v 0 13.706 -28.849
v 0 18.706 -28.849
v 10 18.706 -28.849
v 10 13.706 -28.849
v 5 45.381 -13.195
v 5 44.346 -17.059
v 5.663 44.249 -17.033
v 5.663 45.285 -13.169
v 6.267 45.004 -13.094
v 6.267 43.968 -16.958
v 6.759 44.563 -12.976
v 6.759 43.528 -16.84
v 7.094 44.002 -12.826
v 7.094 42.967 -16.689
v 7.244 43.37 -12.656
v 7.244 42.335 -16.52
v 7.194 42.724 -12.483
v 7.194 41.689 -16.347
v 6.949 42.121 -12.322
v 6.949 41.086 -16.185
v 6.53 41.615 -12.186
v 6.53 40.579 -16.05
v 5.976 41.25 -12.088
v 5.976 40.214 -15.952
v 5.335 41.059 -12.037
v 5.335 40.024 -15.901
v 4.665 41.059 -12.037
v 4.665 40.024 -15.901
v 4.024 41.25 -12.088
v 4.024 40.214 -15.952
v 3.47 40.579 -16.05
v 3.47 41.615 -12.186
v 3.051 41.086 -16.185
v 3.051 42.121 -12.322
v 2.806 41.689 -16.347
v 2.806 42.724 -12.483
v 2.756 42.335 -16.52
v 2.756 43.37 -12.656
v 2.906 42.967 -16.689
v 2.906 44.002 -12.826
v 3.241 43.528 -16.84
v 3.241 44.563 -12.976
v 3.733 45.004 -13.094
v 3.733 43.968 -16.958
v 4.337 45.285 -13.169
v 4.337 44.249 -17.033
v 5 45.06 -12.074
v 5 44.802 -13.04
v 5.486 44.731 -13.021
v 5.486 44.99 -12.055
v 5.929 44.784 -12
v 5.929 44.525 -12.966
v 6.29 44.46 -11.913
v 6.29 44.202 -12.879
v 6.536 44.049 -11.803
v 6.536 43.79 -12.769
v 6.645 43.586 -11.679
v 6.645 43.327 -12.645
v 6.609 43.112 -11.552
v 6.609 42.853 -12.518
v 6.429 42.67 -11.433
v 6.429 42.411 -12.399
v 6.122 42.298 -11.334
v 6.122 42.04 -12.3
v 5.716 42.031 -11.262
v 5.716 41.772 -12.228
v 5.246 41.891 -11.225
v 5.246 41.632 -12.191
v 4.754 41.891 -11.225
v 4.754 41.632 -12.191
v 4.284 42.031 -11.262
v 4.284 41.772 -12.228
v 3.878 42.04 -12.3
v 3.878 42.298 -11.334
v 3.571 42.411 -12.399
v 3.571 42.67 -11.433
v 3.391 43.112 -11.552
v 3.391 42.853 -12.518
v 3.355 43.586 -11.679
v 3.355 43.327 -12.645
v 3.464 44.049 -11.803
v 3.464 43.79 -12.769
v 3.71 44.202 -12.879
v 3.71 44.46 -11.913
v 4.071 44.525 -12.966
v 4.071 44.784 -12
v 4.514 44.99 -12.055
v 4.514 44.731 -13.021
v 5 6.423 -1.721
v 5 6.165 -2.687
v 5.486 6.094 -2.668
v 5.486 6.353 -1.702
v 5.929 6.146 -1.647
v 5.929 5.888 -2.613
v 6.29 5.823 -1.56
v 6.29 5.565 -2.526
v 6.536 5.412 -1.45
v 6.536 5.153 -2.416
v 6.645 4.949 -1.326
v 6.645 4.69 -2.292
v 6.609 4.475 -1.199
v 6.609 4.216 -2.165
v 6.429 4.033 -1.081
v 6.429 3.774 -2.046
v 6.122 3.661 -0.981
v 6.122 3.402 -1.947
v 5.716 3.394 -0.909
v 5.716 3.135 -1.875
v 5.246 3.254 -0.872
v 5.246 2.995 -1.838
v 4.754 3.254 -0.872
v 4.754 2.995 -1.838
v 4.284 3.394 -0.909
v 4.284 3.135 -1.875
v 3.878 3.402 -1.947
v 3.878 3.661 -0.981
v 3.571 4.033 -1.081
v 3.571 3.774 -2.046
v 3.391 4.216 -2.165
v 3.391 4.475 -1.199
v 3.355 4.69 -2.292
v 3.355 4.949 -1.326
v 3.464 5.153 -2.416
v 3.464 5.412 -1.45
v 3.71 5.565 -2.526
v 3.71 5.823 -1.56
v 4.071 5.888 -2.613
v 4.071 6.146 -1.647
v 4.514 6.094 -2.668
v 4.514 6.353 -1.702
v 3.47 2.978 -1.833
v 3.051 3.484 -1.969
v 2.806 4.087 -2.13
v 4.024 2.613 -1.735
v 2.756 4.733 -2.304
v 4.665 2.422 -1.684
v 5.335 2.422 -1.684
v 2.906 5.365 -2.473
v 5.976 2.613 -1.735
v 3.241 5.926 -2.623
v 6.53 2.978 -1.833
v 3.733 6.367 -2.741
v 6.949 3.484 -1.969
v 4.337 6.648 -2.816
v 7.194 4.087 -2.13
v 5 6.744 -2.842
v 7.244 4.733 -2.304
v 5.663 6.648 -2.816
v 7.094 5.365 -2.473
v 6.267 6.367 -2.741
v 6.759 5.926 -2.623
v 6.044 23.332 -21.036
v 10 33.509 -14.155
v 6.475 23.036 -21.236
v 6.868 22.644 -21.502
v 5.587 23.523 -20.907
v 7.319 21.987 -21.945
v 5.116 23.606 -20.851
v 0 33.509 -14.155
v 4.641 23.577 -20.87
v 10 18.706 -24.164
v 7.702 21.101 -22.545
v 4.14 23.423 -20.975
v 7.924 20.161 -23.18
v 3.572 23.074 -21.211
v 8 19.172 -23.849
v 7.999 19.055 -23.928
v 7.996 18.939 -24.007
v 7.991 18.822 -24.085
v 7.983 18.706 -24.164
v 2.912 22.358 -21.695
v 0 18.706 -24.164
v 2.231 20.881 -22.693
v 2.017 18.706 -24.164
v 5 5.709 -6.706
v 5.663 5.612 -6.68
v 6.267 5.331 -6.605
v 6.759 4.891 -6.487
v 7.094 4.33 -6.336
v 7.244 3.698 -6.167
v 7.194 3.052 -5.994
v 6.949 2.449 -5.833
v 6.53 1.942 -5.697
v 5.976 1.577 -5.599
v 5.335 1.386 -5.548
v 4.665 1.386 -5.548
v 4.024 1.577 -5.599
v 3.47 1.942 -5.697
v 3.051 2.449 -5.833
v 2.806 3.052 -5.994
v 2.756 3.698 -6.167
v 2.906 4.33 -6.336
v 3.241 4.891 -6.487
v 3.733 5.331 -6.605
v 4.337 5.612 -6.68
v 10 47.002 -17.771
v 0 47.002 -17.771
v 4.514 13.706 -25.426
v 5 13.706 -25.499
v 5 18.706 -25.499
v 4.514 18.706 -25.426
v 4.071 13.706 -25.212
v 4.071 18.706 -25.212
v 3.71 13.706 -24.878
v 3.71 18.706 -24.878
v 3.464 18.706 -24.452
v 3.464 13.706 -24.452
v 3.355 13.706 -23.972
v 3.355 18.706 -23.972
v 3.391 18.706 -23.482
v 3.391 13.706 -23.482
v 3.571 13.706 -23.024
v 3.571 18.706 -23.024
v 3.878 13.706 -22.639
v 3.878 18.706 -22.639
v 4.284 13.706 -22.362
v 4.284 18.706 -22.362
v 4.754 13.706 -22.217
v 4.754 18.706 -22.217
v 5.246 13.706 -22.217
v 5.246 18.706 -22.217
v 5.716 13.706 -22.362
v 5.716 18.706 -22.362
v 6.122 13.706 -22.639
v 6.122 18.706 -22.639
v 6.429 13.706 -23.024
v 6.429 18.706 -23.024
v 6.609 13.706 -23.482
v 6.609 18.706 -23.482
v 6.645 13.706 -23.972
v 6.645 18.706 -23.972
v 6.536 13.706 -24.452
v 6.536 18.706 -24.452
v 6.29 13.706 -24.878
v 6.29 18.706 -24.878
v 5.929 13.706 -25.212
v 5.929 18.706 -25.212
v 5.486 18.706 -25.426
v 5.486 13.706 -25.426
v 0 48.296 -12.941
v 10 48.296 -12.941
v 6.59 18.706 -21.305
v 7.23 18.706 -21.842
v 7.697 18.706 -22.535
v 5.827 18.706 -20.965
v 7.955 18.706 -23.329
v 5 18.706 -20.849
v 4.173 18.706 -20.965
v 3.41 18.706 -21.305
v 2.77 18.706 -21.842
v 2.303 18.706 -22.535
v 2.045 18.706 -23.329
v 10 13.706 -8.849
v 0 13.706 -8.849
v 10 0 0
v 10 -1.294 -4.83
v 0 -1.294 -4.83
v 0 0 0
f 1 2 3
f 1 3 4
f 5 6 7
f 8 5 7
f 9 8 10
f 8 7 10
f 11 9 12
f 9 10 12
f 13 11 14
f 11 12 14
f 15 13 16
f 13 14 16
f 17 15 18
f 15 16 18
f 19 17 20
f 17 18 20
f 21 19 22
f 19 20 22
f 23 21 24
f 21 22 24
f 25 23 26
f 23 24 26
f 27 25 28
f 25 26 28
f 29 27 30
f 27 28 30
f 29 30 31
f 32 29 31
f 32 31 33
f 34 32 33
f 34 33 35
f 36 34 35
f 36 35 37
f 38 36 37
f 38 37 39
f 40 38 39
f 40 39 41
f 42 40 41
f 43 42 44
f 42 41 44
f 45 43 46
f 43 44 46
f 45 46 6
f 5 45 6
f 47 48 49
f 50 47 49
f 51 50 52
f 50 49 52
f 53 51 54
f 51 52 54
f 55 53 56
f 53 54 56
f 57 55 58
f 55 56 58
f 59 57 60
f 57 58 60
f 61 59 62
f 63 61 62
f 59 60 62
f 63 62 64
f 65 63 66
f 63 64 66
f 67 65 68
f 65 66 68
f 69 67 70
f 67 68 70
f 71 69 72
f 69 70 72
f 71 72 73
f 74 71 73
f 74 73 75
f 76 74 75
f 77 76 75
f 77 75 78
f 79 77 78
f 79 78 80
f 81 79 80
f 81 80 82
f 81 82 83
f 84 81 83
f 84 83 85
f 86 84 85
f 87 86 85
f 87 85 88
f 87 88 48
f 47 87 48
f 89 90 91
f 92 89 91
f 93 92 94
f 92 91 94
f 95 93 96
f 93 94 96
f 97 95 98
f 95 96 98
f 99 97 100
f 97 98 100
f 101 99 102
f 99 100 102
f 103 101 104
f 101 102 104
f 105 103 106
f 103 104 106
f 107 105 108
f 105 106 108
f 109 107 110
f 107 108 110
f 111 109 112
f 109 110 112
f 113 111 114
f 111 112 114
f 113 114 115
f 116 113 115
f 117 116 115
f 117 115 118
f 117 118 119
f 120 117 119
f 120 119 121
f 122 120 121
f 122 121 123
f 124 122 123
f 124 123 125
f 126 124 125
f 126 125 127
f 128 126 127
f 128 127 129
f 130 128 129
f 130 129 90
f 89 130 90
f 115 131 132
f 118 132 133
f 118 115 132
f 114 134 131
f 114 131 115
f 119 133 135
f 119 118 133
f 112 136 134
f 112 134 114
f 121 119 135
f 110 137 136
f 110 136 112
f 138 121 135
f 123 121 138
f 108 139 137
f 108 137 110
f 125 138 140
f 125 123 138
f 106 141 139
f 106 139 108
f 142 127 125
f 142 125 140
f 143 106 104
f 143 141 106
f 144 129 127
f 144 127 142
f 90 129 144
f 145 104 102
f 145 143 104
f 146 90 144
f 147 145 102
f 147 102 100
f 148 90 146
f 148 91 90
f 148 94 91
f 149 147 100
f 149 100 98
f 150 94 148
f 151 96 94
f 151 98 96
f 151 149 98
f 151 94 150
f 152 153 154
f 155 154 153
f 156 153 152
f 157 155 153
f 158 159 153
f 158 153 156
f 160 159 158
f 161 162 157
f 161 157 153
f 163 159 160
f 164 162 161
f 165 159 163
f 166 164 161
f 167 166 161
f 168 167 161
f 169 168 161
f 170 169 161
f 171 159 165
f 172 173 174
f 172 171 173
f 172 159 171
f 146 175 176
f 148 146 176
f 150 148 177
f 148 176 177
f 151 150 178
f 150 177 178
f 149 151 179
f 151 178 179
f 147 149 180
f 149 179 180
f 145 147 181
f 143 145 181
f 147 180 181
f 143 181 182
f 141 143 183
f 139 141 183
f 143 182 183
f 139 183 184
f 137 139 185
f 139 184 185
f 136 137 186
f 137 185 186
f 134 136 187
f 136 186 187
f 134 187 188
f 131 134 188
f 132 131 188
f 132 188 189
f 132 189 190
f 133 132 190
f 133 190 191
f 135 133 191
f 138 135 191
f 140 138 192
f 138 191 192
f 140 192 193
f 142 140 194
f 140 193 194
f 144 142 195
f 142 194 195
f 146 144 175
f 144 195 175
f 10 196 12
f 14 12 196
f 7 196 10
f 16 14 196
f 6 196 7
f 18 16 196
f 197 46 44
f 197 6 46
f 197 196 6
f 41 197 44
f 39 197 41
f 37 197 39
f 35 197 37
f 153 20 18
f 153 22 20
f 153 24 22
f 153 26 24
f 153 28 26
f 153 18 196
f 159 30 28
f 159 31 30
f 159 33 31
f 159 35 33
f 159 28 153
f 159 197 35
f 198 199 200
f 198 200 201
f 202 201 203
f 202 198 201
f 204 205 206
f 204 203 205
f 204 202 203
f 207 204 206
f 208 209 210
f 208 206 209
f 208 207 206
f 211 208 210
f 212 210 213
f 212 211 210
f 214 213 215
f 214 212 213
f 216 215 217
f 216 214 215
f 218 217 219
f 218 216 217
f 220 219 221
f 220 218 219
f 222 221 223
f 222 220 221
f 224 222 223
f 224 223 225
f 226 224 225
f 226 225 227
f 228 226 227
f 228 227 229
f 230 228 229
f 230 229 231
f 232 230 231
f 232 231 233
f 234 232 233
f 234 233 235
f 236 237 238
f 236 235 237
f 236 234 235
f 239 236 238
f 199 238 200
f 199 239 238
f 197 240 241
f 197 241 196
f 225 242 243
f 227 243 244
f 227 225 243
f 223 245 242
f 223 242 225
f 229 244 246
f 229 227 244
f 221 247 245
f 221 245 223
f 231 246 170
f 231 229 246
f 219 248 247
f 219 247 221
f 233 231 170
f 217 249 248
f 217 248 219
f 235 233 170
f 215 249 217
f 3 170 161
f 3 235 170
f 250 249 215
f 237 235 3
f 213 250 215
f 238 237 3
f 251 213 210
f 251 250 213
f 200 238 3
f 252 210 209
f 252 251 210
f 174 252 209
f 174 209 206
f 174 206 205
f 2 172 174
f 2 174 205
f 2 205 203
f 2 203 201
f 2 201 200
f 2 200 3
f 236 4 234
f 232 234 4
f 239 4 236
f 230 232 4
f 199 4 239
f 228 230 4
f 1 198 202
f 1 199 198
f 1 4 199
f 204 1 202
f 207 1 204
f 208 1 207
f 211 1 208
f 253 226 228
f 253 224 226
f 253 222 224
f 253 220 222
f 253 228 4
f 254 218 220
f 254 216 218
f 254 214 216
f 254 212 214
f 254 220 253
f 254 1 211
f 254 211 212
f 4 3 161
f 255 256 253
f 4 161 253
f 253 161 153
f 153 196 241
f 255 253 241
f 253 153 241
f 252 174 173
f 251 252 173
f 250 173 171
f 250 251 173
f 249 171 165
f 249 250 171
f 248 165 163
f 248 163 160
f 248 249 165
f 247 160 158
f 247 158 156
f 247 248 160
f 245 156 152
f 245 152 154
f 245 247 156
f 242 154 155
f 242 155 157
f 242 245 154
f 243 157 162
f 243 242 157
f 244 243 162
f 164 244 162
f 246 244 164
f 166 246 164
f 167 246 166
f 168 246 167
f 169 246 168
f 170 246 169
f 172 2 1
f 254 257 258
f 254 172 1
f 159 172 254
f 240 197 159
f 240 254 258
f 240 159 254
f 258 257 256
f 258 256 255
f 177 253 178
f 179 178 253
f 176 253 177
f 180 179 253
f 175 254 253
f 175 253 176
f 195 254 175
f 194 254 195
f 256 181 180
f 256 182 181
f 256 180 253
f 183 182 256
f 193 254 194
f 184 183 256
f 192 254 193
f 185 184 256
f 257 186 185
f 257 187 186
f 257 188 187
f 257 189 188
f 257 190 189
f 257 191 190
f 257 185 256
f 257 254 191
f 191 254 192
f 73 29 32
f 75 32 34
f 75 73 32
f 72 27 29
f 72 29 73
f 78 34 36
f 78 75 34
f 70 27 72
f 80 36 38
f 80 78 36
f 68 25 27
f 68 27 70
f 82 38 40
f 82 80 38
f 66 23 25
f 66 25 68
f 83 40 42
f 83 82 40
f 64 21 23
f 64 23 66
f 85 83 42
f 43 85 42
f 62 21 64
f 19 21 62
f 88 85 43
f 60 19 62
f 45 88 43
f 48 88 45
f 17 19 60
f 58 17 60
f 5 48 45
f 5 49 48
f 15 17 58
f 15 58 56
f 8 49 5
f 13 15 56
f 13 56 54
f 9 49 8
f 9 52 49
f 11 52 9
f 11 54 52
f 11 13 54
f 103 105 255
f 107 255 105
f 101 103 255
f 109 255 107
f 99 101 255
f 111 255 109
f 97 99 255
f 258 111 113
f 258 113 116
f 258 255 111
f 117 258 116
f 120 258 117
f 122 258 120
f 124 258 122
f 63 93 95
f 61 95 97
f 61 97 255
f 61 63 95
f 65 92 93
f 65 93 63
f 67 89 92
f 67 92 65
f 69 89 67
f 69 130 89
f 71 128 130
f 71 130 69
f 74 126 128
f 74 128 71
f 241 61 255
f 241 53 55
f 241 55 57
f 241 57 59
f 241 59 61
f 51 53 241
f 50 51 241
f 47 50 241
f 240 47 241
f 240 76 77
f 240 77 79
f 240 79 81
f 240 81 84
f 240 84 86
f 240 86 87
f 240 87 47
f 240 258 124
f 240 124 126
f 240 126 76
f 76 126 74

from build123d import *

# Parameters (mm, degrees)
EXTRUDE_2_DEPTH          = 10
SKETCH_3_R               = 1.65
CUT_EXTRUDE_2_DEPTH      = 10
CUT_EXTRUDE_3_DEPTH      = 10
CUT_EXTRUDE_3_DEPTH_BACK = 9
SKETCH_5_R               = 1.65
SKETCH_6_R               = 3
CUT_EXTRUDE_4_DEPTH      = 8
SKETCH_7_R               = 2.25
CUT_EXTRUDE_5_DEPTH      = 4


with BuildPart() as part:
    # 草图1 → 凸台-拉伸2 (new body)
    with BuildSketch(Plane(origin=(0, 0, 0), x_dir=(0, 0, -1), z_dir=(1, 0, 0))):
        Polygon((0, 0), (12.940952255, 48.296291314), (17.770581387, 47.002196089), (14.155128272, 33.509141372), (24.163916678, 18.705904774), (28.848867018, 18.705904774), (28.848867018, 13.705904774), (8.848867018, 13.705904774), (4.829629131, -1.294095226), align=None)
    extrude(amount=EXTRUDE_2_DEPTH)

    # 草图3 → 切除-拉伸2 (cut)
    with BuildSketch(Plane(origin=(0, -1.294095226, -4.829629131), x_dir=(-1, 0, 0), z_dir=(0, -0.2588190451025247, -0.9659258262890673))):
        with Locations(Location((-5, 45, 0), (0, 0, 90))):
            Circle(SKETCH_3_R)
        with Locations(Location((-5, 5, 0), (0, 0, 90))):
            Circle(SKETCH_3_R)
    extrude(amount=-CUT_EXTRUDE_2_DEPTH, mode=Mode.SUBTRACT)

    # 草图5 → 切除-拉伸3 (cut, two sides: drawn at the far end of the back side and taken through both)
    with BuildSketch(Plane(origin=(0, 18.705904774, 0), x_dir=(1, 0, 0), z_dir=(0, 1, 0)).offset(-CUT_EXTRUDE_3_DEPTH_BACK)):
        with Locations(Location((5, 23.848867018, 0), (0, 0, 90))):
            Circle(SKETCH_5_R)
    extrude(amount=CUT_EXTRUDE_3_DEPTH + CUT_EXTRUDE_3_DEPTH_BACK, mode=Mode.SUBTRACT)

    # 草图6 → 切除-拉伸4 (cut)
    with BuildSketch(Plane(origin=(0, 18.705904774, 0), x_dir=(1, 0, 0), z_dir=(0, 1, 0))):
        with Locations((5, 23.848867018)):
            Circle(SKETCH_6_R)
    extrude(amount=CUT_EXTRUDE_4_DEPTH, mode=Mode.SUBTRACT)

    # 草图7 → 切除-拉伸5 (cut)
    with BuildSketch(Plane(origin=(0, -1.294095226, -4.829629131), x_dir=(-1, 0, 0), z_dir=(0, -0.25881904510252446, -0.9659258262890674))):
        with Locations(Location((-5, 45, 0), (0, 0, 90))):
            Circle(SKETCH_7_R)
        with Locations(Location((-5, 5, 0), (0, 0, 90))):
            Circle(SKETCH_7_R)
    extrude(amount=-CUT_EXTRUDE_5_DEPTH, mode=Mode.SUBTRACT)


solid = part.part
